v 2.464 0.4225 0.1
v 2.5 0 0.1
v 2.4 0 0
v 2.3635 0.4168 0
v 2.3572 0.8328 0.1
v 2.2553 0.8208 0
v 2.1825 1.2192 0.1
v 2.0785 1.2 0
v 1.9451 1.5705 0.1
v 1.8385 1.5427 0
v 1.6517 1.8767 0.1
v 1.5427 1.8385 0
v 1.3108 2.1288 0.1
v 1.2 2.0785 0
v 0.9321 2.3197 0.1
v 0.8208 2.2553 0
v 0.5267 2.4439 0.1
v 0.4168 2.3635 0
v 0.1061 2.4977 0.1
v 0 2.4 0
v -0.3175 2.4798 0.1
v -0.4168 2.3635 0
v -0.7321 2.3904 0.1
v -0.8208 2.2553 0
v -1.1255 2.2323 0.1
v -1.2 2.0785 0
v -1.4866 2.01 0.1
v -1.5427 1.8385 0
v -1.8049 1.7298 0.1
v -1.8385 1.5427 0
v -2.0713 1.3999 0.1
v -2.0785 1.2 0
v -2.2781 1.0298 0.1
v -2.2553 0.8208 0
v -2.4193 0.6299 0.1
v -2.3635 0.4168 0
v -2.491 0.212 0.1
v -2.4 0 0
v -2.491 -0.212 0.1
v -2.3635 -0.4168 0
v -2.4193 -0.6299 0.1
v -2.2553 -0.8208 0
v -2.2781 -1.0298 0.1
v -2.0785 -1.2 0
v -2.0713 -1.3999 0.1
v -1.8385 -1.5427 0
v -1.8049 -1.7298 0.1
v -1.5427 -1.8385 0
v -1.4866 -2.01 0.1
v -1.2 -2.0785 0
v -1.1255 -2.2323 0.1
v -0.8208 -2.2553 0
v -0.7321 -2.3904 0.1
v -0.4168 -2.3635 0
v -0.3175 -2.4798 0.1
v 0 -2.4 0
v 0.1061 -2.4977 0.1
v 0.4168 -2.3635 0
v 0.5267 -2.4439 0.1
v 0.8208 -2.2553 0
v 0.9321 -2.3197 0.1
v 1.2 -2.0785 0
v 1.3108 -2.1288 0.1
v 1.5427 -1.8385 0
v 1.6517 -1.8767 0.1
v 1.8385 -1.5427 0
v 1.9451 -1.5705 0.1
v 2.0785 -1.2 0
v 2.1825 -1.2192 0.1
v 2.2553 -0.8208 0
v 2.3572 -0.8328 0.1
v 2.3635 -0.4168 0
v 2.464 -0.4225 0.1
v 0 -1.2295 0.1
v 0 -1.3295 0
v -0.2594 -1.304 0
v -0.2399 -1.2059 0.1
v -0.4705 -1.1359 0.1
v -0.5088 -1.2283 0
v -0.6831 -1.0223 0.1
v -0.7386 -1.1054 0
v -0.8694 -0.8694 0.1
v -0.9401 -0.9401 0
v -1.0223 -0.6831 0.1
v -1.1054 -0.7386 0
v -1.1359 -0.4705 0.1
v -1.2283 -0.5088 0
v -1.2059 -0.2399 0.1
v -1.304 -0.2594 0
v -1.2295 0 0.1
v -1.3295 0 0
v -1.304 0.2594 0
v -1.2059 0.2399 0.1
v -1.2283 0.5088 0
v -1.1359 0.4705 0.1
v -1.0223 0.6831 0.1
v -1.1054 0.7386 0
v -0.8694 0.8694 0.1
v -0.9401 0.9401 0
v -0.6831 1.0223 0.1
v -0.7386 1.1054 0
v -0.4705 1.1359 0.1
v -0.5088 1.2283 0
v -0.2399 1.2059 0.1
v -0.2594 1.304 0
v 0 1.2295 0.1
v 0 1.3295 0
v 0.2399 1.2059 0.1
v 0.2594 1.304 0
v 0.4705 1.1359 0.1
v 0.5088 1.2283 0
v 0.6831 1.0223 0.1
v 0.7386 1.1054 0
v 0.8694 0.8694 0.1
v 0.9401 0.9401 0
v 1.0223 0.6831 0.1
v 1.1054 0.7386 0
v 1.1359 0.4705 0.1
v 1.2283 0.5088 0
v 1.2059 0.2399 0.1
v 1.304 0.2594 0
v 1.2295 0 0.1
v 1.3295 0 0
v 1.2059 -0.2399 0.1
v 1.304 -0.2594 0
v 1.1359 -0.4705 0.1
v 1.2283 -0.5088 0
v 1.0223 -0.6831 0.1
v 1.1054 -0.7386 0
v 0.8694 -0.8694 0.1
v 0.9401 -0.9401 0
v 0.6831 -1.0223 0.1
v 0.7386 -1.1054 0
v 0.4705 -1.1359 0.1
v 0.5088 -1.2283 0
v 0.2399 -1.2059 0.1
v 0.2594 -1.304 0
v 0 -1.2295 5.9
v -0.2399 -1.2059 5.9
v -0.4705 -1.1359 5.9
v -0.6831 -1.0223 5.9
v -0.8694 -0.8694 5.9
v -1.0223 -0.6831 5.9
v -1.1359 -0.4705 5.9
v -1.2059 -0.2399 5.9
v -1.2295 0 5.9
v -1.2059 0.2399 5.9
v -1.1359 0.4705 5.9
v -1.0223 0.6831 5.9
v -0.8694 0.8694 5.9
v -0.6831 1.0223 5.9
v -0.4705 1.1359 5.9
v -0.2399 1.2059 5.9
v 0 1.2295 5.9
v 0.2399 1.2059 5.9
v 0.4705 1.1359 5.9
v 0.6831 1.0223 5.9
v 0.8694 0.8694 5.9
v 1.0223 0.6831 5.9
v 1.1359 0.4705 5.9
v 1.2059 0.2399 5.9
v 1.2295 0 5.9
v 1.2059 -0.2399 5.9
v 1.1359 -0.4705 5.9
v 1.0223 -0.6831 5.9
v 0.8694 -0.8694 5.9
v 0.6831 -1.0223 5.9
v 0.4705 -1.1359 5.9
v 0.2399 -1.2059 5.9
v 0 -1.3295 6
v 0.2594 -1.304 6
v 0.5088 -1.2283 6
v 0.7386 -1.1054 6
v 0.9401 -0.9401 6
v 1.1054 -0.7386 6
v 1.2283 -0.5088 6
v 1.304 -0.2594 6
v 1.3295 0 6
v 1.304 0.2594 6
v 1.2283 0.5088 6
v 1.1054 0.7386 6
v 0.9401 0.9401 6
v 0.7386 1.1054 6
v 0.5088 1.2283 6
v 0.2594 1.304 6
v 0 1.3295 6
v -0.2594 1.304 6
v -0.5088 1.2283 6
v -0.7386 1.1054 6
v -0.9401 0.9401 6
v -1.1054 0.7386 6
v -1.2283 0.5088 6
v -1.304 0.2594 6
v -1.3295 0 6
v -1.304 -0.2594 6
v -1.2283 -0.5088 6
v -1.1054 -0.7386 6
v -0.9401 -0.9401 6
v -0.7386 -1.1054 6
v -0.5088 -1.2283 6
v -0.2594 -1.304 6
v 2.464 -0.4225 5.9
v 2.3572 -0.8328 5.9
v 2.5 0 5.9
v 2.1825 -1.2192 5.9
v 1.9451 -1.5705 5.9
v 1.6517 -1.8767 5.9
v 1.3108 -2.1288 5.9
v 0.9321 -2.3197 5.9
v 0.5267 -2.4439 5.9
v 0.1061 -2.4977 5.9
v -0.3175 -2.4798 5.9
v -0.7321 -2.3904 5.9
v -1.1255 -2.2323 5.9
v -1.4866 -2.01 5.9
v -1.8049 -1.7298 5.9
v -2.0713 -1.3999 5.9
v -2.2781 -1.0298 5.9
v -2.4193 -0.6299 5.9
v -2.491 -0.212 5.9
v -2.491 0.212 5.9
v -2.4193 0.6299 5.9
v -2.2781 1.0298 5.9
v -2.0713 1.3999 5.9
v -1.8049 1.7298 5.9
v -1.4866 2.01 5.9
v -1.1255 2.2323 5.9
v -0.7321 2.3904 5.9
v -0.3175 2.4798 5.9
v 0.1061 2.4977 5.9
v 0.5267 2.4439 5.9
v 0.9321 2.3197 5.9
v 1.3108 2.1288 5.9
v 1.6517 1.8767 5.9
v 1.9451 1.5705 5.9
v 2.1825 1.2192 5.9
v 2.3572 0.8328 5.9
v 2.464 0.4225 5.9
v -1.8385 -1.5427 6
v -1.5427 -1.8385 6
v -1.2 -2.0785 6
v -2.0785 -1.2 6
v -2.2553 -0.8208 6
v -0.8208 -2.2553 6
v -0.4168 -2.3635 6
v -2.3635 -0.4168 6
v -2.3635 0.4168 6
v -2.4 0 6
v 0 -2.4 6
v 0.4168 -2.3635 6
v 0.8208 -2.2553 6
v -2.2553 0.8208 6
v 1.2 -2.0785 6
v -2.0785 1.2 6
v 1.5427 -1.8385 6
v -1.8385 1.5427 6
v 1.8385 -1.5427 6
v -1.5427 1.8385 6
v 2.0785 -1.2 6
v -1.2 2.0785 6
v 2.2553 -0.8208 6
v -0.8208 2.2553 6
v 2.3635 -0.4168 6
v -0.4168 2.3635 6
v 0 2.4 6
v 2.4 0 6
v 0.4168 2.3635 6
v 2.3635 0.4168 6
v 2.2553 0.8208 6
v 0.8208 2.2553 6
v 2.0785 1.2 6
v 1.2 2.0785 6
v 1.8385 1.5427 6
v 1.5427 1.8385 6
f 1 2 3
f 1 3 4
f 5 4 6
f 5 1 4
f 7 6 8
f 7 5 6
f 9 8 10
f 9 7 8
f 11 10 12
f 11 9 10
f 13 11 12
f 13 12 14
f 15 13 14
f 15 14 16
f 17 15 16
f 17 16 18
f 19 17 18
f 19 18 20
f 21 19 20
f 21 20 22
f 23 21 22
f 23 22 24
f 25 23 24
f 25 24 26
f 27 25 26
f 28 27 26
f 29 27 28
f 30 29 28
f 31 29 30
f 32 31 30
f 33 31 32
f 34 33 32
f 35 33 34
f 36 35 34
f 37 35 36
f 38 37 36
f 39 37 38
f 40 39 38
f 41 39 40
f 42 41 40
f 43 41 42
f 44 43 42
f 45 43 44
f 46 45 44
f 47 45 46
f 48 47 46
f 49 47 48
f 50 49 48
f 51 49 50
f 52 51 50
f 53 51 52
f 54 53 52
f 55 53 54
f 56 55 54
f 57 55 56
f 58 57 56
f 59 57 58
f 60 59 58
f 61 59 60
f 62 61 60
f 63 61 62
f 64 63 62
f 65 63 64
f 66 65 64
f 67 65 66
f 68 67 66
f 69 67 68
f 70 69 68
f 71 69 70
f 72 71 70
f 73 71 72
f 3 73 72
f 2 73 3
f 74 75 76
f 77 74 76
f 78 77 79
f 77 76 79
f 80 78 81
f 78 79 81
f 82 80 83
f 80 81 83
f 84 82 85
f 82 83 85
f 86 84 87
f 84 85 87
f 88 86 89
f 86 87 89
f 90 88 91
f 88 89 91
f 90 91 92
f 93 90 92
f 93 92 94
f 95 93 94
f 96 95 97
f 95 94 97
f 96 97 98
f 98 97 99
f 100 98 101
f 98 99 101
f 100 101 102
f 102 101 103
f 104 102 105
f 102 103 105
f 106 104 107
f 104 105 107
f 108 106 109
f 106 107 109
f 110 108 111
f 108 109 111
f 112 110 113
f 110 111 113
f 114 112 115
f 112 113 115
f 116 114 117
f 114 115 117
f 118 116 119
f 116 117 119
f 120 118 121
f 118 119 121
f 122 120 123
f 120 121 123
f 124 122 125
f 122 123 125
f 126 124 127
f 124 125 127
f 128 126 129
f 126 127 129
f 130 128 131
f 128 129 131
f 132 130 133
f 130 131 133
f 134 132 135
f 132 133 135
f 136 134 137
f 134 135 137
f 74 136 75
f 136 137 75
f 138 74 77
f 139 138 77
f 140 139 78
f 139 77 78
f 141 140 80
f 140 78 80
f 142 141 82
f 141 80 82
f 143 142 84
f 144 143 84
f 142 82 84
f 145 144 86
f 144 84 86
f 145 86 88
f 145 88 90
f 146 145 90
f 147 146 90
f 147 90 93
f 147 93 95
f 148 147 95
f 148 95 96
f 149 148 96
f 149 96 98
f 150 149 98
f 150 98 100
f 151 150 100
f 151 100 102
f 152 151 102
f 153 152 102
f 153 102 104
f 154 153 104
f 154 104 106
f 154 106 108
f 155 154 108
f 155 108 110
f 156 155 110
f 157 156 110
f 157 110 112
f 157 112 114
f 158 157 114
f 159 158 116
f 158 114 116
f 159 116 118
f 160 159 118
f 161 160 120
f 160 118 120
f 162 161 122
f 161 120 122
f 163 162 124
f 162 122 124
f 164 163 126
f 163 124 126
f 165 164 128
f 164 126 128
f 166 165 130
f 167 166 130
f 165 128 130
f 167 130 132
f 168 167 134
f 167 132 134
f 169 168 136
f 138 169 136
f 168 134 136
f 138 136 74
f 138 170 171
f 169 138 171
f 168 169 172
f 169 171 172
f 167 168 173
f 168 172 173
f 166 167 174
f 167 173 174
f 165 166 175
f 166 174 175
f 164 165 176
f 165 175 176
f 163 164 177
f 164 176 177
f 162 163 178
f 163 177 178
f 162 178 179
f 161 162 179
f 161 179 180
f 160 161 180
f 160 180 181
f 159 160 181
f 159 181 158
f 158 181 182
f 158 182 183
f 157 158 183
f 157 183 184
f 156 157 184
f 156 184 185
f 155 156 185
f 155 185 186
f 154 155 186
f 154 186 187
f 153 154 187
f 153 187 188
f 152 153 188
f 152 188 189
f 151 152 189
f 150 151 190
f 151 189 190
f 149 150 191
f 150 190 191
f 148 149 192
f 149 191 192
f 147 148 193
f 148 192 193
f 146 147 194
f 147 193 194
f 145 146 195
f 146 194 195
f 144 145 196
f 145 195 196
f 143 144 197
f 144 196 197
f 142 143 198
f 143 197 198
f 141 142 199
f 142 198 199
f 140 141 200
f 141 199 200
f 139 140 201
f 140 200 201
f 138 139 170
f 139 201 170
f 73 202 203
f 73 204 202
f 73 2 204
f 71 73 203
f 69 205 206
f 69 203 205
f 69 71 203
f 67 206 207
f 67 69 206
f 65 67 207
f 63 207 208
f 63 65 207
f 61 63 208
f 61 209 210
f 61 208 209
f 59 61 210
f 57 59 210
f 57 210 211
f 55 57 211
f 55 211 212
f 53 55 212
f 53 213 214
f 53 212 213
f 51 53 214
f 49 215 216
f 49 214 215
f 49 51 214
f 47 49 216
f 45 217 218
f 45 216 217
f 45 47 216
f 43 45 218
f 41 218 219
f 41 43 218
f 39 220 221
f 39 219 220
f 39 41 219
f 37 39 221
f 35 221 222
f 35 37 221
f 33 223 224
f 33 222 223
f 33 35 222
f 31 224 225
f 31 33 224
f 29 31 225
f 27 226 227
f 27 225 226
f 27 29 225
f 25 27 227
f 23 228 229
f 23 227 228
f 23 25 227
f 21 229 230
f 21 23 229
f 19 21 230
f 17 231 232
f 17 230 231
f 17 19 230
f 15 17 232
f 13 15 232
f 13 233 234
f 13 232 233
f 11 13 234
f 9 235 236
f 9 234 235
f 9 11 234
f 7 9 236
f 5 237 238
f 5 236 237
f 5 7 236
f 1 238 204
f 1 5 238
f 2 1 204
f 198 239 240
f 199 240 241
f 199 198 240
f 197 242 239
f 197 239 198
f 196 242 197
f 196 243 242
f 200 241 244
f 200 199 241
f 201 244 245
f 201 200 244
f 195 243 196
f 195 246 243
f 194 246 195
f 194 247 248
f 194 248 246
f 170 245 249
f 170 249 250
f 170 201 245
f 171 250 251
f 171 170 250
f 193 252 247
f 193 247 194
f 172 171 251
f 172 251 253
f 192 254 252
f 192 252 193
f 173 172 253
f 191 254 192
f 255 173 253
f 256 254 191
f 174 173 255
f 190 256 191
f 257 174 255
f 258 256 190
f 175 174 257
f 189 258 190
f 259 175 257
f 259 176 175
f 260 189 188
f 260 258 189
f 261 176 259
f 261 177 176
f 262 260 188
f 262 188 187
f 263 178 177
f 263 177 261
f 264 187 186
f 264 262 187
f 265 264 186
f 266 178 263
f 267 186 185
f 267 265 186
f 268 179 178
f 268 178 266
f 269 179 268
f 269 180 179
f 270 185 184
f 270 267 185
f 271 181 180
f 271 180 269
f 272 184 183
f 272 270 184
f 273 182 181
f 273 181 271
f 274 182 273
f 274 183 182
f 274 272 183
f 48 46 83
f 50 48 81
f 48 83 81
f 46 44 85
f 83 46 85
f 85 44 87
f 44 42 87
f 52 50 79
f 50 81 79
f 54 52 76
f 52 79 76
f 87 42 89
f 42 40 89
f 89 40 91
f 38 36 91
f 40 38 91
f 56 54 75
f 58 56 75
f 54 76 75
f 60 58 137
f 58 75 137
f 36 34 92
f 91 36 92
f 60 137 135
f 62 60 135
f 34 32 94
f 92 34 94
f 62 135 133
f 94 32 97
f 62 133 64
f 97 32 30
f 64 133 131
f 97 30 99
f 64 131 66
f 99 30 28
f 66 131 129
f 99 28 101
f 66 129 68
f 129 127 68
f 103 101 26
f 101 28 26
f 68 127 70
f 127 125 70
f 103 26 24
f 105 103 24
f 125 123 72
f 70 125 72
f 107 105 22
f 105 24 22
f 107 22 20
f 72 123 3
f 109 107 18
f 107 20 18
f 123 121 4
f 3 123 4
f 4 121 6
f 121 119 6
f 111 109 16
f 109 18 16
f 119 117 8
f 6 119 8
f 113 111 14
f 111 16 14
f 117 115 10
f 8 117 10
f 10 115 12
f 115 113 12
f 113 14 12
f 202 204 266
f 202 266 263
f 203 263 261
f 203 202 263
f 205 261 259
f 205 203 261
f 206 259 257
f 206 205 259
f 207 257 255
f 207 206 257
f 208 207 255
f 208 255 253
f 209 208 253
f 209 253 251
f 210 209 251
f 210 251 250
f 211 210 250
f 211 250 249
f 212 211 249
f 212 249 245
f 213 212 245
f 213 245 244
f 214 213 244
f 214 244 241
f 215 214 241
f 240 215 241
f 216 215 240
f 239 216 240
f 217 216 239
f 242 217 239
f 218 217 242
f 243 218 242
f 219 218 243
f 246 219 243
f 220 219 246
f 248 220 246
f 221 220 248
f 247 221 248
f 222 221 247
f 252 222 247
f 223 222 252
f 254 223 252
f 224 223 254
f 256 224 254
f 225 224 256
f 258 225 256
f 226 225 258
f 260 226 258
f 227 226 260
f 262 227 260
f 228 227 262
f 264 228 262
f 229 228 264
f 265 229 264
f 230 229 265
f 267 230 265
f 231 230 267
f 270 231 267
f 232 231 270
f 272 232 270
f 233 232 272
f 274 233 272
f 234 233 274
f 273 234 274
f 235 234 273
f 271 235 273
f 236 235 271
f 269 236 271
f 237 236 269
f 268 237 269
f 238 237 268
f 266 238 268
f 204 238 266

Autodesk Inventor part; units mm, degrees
ref_plane "YZ Plane" through (0, 0, 0) normal (1, 0, 0) x (0, 1, 0)
ref_plane "XZ Plane" through (0, 0, 0) normal (0, 1, 0) x (-1, 0, 0)
ref_plane "XY Plane" through (0, 0, 0) normal (0, 0, 1) x (1, 0, 0)
sketch "スケッチ1" plane through (0, 0, 0) normal (0, 0, 1) x (1, 0, 0)
  circle A0 centre (0, 0) radius 2.5
  dimension "d0" = 5
extrude "押し出し1" add sketch "スケッチ1" along normal blind 6
sketch "スケッチ2" plane through (0, 0, 6) normal (0, 0, 1) x (1, 0, 0)
  circle A0 centre (0, 0) radius 2.5 construction
hole "穴1" at (0, 0, 6) direction (0, 0, -1) diameter 2.459 end through all thread size "M3x0.5" class "6H" standard "ANSI Metric M Profile"
chamfer "面取り1" distance 0.1 angle 45 4 edges at (0, 1.2295, 6) (-2.5, 0, 6) (-2.5, 0, 0) (0, 1.2295, 0)
properties part number "SB-305060" material "真鍮、ソフト イエロー"
